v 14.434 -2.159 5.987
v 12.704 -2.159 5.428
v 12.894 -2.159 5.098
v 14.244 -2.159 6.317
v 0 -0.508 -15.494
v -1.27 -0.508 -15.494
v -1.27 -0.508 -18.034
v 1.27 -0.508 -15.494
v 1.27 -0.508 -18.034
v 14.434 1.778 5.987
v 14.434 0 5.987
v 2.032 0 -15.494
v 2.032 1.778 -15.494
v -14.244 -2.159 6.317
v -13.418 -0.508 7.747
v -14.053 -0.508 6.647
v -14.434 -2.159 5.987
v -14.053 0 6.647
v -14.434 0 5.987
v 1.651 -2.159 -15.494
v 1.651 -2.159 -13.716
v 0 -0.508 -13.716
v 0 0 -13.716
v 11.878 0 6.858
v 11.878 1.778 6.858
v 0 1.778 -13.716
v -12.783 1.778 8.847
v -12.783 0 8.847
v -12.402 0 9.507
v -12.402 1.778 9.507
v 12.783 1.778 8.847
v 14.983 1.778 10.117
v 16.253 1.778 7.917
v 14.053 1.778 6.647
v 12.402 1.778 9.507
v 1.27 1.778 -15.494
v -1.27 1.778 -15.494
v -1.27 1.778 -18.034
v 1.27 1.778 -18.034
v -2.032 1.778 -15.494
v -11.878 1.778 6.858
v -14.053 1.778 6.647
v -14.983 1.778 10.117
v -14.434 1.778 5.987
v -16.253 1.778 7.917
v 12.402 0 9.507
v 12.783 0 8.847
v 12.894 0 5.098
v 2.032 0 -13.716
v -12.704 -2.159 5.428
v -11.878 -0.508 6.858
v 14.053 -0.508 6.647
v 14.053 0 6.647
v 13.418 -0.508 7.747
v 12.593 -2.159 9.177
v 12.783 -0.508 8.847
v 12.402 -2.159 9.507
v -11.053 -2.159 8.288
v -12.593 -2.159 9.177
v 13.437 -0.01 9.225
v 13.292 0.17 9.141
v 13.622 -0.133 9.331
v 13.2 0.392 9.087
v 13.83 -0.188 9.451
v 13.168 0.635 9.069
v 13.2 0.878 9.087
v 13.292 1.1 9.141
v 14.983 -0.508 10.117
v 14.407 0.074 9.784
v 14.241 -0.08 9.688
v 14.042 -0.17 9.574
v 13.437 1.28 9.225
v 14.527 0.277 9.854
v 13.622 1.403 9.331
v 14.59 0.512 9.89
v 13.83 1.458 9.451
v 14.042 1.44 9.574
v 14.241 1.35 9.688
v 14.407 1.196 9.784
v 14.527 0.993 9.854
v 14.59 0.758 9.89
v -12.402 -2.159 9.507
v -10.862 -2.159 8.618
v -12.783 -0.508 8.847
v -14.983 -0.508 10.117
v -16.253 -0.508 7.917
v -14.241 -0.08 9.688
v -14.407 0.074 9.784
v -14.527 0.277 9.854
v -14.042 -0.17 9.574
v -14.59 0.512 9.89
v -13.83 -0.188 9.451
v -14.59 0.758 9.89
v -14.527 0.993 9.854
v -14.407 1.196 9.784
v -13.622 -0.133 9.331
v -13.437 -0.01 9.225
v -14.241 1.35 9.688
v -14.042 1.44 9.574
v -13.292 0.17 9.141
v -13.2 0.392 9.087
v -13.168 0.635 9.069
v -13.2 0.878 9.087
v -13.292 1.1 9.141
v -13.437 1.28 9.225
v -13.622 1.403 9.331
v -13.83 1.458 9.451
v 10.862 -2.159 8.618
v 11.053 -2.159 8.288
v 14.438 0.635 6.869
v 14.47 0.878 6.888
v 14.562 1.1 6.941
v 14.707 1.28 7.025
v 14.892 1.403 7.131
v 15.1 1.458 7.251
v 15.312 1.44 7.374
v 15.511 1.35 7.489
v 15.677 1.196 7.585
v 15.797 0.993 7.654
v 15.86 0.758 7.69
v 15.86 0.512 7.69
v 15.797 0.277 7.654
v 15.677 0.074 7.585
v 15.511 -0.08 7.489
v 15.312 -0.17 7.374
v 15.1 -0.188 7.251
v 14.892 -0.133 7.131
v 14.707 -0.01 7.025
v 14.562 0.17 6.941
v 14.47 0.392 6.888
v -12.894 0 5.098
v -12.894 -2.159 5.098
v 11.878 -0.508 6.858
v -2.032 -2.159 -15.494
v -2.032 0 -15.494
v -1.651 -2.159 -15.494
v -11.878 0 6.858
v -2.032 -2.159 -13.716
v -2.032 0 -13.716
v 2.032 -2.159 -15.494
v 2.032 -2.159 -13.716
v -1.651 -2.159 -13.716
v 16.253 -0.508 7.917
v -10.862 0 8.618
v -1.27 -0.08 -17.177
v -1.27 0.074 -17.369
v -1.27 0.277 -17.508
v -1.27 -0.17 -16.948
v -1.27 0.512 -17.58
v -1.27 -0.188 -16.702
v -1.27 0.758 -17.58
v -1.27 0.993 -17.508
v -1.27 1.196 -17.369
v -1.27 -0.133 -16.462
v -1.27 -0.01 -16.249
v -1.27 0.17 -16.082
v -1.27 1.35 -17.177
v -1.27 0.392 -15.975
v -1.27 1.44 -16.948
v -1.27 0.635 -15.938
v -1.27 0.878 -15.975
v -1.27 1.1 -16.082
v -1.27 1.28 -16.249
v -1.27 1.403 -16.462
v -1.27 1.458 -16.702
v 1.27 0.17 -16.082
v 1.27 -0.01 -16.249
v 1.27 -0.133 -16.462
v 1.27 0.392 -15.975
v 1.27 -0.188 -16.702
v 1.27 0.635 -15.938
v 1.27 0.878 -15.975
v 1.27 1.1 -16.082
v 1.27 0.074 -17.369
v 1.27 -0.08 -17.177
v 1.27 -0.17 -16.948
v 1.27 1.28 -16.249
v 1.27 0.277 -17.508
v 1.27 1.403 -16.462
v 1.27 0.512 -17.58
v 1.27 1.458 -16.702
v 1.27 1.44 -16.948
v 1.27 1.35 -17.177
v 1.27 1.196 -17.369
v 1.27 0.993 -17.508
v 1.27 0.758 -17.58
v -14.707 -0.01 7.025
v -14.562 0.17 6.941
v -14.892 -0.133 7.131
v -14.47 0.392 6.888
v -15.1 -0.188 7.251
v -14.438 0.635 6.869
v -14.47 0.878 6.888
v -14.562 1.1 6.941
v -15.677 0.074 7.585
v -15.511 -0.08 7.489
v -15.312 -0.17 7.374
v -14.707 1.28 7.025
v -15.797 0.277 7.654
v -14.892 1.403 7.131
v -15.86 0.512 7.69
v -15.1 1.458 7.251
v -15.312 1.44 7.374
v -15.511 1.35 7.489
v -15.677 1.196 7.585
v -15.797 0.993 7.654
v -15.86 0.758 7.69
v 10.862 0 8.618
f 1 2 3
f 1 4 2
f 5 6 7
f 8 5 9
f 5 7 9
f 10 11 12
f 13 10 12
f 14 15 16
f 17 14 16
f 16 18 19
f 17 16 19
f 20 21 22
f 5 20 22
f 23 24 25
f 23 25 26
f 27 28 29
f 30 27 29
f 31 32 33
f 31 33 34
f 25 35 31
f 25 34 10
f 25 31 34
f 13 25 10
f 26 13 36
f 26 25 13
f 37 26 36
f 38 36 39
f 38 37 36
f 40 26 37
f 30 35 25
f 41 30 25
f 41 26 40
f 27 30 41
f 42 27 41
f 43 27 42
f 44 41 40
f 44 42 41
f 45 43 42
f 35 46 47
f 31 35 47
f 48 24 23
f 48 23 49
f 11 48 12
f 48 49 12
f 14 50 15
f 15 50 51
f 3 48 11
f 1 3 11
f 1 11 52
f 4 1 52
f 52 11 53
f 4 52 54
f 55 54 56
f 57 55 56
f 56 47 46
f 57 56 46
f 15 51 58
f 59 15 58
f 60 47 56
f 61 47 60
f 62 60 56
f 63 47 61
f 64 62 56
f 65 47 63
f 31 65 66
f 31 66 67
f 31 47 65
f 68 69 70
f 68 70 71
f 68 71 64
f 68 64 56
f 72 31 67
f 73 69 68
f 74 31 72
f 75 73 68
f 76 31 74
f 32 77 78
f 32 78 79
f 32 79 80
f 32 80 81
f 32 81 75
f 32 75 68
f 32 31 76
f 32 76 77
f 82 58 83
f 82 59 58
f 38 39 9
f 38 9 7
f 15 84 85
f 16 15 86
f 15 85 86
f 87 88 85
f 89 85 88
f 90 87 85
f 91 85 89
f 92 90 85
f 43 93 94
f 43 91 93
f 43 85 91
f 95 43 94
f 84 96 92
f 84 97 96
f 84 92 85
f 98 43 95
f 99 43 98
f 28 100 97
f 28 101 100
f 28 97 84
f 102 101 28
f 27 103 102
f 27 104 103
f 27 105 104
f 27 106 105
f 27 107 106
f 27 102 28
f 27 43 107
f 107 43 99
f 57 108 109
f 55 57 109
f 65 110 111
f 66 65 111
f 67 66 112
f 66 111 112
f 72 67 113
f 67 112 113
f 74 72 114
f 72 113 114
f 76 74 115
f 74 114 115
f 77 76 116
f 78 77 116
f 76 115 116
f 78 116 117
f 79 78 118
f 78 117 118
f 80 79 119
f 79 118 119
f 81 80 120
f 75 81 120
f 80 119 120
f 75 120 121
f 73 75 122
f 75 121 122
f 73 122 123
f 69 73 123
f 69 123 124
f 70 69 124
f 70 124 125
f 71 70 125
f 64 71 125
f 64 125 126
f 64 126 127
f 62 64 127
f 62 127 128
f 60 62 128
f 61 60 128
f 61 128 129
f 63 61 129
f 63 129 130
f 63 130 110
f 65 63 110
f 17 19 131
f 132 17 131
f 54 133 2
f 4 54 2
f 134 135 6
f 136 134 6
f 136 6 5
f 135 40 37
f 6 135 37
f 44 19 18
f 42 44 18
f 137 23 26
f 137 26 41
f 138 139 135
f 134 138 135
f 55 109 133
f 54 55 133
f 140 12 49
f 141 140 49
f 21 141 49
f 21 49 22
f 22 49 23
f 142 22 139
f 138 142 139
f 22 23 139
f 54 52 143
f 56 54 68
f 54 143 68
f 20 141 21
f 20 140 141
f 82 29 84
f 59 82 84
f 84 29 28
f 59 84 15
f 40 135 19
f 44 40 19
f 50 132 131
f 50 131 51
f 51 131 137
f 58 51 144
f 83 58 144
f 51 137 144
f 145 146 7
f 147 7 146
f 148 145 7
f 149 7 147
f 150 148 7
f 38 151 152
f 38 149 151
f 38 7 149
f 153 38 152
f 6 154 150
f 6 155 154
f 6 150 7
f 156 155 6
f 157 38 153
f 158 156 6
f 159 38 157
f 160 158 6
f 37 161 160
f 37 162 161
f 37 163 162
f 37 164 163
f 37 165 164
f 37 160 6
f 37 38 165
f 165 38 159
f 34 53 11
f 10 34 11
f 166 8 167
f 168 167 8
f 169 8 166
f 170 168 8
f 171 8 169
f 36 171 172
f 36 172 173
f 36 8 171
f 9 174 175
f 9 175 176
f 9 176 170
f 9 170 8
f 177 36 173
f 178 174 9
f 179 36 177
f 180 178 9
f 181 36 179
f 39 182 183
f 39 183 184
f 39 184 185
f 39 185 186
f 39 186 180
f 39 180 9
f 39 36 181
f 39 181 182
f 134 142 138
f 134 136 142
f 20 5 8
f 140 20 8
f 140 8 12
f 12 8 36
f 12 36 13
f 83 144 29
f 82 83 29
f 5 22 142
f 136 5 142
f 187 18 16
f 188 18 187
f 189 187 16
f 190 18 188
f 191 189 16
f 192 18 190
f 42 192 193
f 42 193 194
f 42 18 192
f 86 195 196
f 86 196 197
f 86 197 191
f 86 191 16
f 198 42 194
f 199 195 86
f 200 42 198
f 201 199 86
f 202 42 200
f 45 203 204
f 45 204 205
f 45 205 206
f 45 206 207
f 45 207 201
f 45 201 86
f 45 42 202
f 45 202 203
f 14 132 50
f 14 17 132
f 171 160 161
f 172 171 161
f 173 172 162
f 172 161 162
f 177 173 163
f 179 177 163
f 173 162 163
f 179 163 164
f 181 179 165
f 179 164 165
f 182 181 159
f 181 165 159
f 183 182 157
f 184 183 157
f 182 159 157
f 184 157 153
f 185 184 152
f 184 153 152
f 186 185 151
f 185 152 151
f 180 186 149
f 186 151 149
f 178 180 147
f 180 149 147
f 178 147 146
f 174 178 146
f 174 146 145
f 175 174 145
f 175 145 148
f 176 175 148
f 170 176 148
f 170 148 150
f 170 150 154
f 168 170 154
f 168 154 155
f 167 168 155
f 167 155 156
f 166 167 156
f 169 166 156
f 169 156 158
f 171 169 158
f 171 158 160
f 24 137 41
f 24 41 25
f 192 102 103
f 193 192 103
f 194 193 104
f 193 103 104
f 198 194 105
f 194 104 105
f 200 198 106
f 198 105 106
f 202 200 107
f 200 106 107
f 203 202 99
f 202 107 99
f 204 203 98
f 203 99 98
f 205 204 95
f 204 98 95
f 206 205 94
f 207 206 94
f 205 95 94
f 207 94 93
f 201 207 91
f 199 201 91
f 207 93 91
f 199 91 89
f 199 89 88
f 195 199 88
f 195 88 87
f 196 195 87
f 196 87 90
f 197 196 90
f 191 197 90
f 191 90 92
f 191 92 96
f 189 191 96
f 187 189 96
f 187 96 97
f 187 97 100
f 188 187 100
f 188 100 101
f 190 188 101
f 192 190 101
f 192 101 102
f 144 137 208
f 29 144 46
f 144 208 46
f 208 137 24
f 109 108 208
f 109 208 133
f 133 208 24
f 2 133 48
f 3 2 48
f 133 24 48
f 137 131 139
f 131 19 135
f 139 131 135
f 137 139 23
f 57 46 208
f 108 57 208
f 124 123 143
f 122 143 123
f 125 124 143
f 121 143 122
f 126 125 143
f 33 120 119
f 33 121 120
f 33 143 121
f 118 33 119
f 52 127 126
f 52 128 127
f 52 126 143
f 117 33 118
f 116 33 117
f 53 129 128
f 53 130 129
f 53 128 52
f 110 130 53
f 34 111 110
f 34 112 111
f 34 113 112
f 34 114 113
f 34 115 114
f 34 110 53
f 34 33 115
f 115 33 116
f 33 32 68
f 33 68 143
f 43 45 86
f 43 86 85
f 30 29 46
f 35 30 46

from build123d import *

# Parameters (mm, degrees)
BOSS_EXTRUDE1_DEPTH          = 1.778
BOSS_EXTRUDE2_DEPTH          = 2.159
CUT_EXTRUDE1_DEPTH           = 28.428162383
BOSS_EXTRUDE4_DEPTH          = 2.286
F_97_0_0059_DIAMETER_HOLE1_D = 1.651
CIRPATTERN2_COUNT            = 3
CIRPATTERN3_COUNT            = 3


with BuildPart() as part:
    # Sketch1 → Boss-Extrude1 (new body)
    with BuildSketch(Plane(origin=(0, 0, 0), x_dir=(1, 0, 0), z_dir=(0, 1, 0))):
        Polygon((-2.032, 15.494), (-14.434197606, -5.98723638), (-13.418197606, -7.747), (-12.402197606, -9.50676362), (12.402197606, -9.50676362), (13.418197606, -7.747), (14.434197606, -5.98723638), (2.032, 15.494), (0, 15.494), align=None)
        Polygon((0, 13.716), (-11.878404438, -6.858), (11.878404438, -6.858), align=None, mode=Mode.SUBTRACT)
    extrude(amount=BOSS_EXTRUDE1_DEPTH)

    # Sketch3 → Boss-Extrude2 (add)
    with BuildSketch(Plane(origin=(0, 0, 0), x_dir=(-1, 0, 0), z_dir=(0, -1, 0))):
        Polygon((0, 13.716), (2.032, 13.716), (2.032, 15.494), (-2.032, 15.494), (-2.032, 13.716), align=None)
    boss_extrude2 = extrude(amount=BOSS_EXTRUDE2_DEPTH)

    # Sketch4 → Cut-Extrude1 (cut, through all)
    with BuildSketch(Plane.XY.offset(-13.716)):
        Polygon((0, -0.508), (-2.694076836, -3.202076836), (2.694076836, -3.202076836), align=None)
    cut_extrude1 = extrude(amount=-CUT_EXTRUDE1_DEPTH, mode=Mode.SUBTRACT)

    # Sketch6 → Boss-Extrude4 (add)
    with BuildSketch(Plane(origin=(0, 1.778, 0), x_dir=(1, 0, 0), z_dir=(0, 1, 0))):
        Polygon((0, 15.494), (1.27, 15.494), (1.27, 18.034), (-1.27, 18.034), (-1.27, 15.494), align=None)
    boss_extrude4 = extrude(amount=-BOSS_EXTRUDE4_DEPTH)

    # #97 (0.0059) Diameter Hole1 (through all)
    with Locations(Plane(origin=(1.27, 0, 0), x_dir=(0, 0, -1), z_dir=(1, 0, 0))):
        with Locations((16.764, 0.635)):
            f_97_0_0059_diameter_hole1 = Hole(F_97_0_0059_DIAMETER_HOLE1_D / 2)

    # CirPattern2: Boss-Extrude2, Cut-Extrude1 ×3 about axis
    cirpattern2_axis = Axis((0, 0, 0), (0, 1, 0))
    add([boss_extrude2.rotate(cirpattern2_axis, i * 360 / CIRPATTERN2_COUNT) for i in range(1, CIRPATTERN2_COUNT)])
    add([cut_extrude1.rotate(cirpattern2_axis, i * 360 / CIRPATTERN2_COUNT) for i in range(1, CIRPATTERN2_COUNT)], mode=Mode.SUBTRACT)

    # CirPattern3: Boss-Extrude4, #97 (0.0059) Diameter Hole1 ×3 about axis
    cirpattern3_axis = Axis((0, 0, 0), (0, 1, 0))
    add([boss_extrude4.rotate(cirpattern3_axis, i * 360 / CIRPATTERN3_COUNT) for i in range(1, CIRPATTERN3_COUNT)])
    add([f_97_0_0059_diameter_hole1.rotate(cirpattern3_axis, i * 360 / CIRPATTERN3_COUNT) for i in range(1, CIRPATTERN3_COUNT)], mode=Mode.SUBTRACT)


solid = part.part
